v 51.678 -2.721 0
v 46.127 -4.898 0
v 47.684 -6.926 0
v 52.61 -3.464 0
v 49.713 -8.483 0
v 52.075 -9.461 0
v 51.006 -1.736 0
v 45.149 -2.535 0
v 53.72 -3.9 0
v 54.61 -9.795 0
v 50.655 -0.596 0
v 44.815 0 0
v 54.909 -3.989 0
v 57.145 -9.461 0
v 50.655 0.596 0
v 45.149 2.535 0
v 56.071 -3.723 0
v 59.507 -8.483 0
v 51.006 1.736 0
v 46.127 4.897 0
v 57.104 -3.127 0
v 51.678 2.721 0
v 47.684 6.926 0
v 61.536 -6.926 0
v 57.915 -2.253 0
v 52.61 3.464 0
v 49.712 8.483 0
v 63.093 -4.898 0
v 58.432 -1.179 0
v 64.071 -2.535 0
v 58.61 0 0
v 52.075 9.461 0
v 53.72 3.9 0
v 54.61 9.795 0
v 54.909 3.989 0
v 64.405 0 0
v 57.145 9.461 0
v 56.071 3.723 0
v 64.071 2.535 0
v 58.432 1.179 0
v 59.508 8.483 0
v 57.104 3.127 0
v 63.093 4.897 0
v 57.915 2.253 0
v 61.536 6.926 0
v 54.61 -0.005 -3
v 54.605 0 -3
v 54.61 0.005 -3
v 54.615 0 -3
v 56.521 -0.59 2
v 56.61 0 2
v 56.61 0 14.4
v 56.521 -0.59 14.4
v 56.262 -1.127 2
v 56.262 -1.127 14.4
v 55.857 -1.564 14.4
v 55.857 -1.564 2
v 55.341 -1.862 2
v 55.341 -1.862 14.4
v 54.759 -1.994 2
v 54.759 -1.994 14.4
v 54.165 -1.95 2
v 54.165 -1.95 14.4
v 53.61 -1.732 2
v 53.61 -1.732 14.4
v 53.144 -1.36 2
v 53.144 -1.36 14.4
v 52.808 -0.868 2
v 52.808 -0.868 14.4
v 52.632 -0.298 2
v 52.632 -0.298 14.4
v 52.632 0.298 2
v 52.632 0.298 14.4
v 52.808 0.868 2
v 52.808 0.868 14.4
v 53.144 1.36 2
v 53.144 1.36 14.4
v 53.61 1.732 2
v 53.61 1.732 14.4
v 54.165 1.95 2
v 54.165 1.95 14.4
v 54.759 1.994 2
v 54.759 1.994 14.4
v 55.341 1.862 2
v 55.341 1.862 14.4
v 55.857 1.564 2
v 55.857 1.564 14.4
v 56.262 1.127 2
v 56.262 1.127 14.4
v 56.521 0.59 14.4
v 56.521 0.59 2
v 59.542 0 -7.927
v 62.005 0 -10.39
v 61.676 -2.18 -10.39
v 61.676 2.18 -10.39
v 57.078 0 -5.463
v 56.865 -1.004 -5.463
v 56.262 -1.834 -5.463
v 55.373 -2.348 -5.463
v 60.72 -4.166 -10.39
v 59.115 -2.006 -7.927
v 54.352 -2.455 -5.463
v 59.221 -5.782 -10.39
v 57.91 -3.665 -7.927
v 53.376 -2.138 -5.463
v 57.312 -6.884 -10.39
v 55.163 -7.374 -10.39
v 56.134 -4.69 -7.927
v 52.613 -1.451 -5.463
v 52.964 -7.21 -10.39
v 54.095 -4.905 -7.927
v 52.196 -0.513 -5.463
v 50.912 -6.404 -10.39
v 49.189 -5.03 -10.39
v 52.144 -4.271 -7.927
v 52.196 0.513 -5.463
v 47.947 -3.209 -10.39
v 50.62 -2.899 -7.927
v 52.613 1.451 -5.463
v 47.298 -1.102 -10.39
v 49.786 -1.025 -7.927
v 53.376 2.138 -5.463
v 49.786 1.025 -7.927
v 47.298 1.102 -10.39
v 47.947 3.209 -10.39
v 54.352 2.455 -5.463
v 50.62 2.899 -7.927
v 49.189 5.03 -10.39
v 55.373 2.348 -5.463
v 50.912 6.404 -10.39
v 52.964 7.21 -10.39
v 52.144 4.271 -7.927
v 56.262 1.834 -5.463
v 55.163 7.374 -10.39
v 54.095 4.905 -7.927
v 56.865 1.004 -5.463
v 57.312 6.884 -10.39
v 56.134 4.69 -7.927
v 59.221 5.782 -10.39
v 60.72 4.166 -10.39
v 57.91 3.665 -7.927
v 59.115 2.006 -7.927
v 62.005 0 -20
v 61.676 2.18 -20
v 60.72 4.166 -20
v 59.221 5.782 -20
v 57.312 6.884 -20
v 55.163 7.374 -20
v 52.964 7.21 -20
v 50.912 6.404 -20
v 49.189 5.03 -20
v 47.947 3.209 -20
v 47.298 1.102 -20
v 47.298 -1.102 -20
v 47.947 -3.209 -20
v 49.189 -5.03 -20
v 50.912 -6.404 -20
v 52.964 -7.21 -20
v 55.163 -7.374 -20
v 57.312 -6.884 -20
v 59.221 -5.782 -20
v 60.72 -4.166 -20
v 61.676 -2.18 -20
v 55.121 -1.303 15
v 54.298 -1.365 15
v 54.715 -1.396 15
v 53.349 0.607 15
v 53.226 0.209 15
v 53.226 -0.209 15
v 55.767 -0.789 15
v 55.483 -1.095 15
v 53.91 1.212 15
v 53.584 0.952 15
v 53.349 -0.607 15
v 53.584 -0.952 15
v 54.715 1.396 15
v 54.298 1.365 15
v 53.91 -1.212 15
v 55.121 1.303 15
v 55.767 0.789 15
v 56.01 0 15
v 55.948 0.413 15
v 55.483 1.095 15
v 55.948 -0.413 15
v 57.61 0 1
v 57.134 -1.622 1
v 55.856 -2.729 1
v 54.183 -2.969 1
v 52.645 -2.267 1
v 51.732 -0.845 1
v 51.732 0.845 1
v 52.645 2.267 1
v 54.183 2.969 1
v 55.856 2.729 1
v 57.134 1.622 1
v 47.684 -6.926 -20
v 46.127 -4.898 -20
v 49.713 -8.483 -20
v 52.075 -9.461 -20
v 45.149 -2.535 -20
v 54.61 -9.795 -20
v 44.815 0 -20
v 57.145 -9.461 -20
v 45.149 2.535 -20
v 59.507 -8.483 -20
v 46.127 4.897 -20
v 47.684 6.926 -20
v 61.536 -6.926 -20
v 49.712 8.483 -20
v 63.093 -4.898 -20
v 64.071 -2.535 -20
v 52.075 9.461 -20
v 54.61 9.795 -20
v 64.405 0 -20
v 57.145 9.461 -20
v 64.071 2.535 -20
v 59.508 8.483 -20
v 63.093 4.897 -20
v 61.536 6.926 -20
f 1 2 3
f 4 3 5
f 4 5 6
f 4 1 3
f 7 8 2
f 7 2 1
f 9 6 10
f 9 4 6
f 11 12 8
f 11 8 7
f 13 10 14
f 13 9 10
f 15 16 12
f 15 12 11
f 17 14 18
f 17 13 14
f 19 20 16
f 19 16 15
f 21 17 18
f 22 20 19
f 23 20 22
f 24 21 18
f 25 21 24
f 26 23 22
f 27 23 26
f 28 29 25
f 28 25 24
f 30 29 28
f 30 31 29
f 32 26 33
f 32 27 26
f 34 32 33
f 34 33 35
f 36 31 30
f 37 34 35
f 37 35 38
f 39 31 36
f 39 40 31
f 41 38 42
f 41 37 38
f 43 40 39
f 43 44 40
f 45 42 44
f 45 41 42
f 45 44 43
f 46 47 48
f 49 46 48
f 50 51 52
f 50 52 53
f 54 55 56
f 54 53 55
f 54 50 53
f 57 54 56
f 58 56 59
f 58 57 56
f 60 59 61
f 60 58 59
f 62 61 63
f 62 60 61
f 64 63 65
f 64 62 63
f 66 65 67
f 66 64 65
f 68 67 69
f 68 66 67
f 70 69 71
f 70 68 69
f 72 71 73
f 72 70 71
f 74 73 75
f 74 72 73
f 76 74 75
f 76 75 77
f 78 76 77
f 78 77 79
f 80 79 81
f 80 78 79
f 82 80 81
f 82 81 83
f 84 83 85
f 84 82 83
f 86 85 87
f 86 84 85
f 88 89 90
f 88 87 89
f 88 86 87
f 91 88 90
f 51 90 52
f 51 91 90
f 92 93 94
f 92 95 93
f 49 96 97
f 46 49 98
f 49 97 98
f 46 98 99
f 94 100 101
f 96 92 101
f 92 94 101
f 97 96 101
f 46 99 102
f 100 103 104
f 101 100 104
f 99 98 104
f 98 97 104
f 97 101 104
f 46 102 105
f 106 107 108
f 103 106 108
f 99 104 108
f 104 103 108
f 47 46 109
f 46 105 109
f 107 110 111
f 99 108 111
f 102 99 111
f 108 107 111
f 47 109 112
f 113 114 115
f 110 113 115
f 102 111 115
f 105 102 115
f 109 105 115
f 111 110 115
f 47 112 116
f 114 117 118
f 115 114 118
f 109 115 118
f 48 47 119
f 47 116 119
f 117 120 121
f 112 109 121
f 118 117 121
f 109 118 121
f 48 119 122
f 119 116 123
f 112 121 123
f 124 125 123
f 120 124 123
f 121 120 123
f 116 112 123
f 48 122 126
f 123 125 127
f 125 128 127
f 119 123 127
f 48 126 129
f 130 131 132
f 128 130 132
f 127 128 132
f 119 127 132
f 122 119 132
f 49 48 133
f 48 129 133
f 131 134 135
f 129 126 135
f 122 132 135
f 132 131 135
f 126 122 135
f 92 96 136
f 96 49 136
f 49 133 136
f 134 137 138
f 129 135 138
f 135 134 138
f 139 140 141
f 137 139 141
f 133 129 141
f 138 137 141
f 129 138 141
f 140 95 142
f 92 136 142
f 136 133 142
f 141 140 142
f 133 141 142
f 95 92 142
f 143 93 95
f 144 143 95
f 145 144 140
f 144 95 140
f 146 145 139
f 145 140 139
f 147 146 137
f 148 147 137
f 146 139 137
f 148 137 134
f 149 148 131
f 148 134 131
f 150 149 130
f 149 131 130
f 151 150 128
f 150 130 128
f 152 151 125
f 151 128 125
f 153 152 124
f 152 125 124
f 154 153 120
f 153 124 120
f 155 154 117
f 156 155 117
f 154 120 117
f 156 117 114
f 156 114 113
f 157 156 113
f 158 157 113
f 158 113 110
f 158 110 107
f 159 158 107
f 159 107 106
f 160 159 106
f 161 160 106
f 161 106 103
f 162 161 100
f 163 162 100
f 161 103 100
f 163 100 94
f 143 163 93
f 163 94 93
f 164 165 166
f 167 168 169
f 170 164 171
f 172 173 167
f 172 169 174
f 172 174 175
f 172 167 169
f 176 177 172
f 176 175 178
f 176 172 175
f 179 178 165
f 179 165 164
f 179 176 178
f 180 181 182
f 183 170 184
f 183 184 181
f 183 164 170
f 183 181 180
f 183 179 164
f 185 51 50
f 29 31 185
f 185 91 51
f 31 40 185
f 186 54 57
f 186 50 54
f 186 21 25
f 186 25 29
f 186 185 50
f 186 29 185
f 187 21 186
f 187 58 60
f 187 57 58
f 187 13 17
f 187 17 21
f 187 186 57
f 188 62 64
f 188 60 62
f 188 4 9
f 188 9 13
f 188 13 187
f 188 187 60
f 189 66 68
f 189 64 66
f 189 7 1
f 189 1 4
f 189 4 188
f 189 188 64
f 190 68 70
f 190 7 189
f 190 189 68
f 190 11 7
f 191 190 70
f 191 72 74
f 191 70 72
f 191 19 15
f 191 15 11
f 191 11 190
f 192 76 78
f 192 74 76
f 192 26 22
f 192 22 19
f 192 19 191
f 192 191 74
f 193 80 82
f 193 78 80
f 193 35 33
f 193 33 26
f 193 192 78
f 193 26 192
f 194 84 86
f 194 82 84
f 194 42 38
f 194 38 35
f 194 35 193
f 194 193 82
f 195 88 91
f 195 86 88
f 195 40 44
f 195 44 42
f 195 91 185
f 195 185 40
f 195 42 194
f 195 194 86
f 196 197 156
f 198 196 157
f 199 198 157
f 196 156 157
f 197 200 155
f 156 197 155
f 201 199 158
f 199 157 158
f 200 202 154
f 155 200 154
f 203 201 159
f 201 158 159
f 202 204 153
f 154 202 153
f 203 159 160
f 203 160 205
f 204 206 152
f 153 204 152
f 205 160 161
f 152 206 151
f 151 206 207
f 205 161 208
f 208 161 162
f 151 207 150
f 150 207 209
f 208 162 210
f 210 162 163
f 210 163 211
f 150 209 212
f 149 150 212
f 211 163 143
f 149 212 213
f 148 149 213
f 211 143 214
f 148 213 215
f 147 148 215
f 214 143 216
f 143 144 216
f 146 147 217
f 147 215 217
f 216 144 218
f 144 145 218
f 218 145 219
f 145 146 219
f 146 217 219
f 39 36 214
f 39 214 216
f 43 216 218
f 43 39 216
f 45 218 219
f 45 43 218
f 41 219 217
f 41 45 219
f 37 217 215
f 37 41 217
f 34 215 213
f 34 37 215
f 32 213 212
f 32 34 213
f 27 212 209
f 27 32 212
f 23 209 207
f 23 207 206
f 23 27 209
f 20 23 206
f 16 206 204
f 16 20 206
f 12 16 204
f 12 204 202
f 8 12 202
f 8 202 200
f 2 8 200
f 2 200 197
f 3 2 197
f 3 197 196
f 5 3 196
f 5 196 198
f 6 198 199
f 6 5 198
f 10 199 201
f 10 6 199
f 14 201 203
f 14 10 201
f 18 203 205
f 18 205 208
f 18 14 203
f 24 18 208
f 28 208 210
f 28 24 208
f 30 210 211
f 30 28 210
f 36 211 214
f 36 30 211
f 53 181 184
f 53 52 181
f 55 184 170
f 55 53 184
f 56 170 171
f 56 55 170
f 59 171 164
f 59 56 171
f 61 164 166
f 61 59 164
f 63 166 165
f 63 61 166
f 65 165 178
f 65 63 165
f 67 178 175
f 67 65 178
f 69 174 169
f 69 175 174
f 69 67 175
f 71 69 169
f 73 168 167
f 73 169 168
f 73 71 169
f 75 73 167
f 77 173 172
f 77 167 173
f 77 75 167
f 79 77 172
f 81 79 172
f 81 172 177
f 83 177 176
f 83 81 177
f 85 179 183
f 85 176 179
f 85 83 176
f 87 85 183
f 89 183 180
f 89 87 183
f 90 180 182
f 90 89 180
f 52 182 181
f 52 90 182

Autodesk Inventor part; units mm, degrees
ref_plane "YZ Plane" through (0, 0, 0) normal (1, 0, 0) x (0, 1, 0)
ref_plane "XZ Plane" through (0, 0, 0) normal (0, 1, 0) x (-1, 0, 0)
ref_plane "XY Plane" through (0, 0, 0) normal (0, 0, 1) x (1, 0, 0)
sketch "Sketch1" plane through (0, 0, 0) normal (0, 0, 1) x (1, 0, 0)
  circle A0 centre (54.61, 0) radius 7.395 projected
  circle A1 centre (54.61, 0) radius 9.795
  point P0 (0, 0)
  dimension "d0" = 2.4
extrude "Extrusion1" add sketch "Sketch1" against normal blind 20
sketch "Sketch2" plane through (54.61, 0, 0) normal (0, 0, 1) x (1, 0, 0)
  circle A0 centre (0, 0) radius 7.395 projected
  circle A1 centre (0, 0) radius 9.795 projected
  circle A2 centre (0, 0) radius 2 projected
  point P0 (-54.61, 0)
extrude "Extrusion2" add sketch "Sketch2" against normal blind 3 contours A0 | A1 | A2
sketch "Sketch3" plane through (54.61, 0, 0) normal (0, 0, 1) x (1, 0, 0)
  circle A0 centre (0, 0) radius 2 projected
  point P0 (-54.61, 0)
extrude "Extrusion3" add sketch "Sketch3" along normal blind 15
chamfer "Chamfer1" distance 2 angle 45 1 edges at (52.61, 0, 0)
chamfer "Chamfer2" distance 0.6 angle 45 1 edges at (52.61, 0, 15)
chamfer "Chamfer3" distance 7.39 angle 45 1 edges at (47.215, 0, -3)
properties part number "Transmission_Mount_Tester"
